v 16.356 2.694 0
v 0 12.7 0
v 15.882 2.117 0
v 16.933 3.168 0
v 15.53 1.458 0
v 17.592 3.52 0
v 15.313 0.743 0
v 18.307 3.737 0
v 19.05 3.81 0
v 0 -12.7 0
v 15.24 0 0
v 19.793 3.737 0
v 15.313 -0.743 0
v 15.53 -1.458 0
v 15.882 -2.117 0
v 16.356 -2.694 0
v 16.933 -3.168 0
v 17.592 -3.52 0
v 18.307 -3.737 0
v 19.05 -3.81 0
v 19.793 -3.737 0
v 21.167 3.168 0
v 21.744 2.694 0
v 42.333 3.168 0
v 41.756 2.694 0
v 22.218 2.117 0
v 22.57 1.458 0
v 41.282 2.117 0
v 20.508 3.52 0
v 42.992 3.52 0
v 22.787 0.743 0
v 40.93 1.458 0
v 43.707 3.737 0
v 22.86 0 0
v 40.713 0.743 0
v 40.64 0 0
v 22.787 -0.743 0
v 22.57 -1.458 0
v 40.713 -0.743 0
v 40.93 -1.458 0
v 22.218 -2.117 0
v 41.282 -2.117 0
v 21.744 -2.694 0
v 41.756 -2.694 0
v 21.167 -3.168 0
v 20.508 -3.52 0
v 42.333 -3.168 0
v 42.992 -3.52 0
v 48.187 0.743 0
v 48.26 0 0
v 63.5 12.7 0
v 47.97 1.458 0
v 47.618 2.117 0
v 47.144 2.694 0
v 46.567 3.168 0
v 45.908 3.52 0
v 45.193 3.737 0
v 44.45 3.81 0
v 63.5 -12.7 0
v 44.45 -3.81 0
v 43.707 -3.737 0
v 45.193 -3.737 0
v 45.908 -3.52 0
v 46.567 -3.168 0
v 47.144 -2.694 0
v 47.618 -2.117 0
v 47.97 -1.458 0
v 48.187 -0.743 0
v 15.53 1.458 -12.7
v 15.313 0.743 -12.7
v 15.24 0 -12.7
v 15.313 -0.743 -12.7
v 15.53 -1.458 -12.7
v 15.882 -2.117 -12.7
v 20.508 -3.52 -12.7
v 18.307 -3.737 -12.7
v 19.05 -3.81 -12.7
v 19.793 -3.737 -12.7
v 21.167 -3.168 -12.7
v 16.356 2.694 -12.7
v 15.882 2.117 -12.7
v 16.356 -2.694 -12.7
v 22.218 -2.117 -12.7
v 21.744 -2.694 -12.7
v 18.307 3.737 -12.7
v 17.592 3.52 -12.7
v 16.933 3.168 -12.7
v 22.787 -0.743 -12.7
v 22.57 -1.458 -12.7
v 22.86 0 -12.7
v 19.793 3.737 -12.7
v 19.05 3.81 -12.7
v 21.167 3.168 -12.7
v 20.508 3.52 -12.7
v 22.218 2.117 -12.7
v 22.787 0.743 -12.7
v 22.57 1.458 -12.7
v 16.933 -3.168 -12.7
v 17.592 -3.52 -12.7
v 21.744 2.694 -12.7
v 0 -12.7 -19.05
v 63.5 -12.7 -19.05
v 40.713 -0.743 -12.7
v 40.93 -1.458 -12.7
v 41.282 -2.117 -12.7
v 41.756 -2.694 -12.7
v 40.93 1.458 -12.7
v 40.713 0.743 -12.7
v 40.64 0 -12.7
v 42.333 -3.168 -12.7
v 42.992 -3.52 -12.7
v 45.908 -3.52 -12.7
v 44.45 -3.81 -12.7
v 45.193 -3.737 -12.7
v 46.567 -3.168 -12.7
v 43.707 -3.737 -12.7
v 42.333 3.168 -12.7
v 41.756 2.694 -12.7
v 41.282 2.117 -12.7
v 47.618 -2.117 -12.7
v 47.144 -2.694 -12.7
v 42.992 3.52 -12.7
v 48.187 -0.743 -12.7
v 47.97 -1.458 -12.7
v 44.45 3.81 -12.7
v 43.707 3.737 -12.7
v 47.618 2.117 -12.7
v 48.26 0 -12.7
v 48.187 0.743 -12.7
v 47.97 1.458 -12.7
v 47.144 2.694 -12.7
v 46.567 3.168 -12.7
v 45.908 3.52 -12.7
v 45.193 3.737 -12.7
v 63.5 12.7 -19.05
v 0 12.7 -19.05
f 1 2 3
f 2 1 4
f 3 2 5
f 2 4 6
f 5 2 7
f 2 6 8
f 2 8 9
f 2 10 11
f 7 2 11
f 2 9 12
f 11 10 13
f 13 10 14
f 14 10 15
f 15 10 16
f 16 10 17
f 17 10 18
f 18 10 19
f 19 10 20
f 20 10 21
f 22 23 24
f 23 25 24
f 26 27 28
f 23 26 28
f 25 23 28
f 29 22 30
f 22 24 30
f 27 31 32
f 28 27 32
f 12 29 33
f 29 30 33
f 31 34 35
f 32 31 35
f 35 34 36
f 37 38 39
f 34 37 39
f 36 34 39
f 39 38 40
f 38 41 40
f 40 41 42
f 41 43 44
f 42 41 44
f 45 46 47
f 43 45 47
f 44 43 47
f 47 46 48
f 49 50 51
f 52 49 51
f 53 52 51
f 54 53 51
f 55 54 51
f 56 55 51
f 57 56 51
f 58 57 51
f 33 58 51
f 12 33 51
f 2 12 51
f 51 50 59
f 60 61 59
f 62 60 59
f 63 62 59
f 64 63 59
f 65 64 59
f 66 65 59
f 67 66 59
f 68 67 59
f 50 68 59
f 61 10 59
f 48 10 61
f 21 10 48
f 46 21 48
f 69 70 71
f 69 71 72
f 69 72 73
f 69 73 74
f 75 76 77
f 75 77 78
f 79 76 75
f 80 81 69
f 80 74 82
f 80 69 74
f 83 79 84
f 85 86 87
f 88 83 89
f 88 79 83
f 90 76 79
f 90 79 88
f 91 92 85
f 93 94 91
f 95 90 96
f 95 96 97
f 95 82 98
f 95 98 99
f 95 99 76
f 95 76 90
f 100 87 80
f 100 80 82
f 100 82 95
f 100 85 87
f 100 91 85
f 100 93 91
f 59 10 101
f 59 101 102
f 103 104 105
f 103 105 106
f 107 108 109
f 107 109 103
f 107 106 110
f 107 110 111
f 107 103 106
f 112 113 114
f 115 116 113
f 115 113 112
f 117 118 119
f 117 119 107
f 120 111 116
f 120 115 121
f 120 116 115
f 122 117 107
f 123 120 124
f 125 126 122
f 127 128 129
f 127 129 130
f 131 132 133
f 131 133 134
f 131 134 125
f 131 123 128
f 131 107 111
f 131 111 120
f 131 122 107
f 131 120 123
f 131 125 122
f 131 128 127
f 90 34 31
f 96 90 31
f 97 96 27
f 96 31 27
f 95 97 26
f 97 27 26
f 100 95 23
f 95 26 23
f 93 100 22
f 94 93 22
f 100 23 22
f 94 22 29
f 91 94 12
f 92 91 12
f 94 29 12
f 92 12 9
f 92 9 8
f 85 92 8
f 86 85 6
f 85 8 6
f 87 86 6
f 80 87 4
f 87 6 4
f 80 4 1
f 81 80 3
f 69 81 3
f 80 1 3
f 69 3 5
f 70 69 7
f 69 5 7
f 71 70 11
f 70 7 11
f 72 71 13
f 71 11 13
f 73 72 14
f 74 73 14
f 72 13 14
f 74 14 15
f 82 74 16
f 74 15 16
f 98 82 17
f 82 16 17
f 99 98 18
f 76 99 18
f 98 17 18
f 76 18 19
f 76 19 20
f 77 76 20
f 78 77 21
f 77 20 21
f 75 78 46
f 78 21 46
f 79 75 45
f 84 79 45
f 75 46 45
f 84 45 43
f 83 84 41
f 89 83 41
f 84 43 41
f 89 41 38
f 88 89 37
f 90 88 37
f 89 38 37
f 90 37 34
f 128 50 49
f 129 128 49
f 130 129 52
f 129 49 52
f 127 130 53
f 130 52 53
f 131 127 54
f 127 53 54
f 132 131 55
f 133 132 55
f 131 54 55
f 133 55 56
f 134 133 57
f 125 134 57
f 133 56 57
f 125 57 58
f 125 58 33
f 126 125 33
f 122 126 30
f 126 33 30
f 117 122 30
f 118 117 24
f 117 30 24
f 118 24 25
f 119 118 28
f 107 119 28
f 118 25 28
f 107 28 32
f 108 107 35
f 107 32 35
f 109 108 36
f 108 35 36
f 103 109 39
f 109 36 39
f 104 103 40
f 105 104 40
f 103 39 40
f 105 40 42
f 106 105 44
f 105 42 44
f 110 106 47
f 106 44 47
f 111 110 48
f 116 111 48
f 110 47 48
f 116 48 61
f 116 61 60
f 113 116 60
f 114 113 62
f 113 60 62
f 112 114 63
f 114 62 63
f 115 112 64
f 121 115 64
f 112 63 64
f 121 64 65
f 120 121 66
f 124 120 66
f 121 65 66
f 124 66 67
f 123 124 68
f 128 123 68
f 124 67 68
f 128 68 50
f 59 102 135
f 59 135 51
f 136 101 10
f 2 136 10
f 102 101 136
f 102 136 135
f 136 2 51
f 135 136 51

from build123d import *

# Parameters (mm, degrees)
F0_W     = 63.5
F0_H     = 19.05
F1_DEPTH = 12.7
F2_R     = 3.81
F3_DEPTH = 12.7


# Not quite as in the source:
# - a feature names something its author has since deleted; it is built from what else it names


with BuildPart() as f1:
    # F0 (on Front) → F1 (new body, symmetric)
    with BuildSketch(Plane.XZ):
        with Locations((31.75, -9.525)):
            Rectangle(F0_W, F0_H)
    extrude(amount=F1_DEPTH, both=True)

    # F2 (on face) → F3 (cut)
    with BuildSketch(Plane.XY):
        with Locations((44.45, 0)):
            Circle(F2_R)
        with Locations((19.05, 0)):
            Circle(F2_R)
    extrude(amount=-F3_DEPTH, mode=Mode.SUBTRACT)


solid = f1.part
